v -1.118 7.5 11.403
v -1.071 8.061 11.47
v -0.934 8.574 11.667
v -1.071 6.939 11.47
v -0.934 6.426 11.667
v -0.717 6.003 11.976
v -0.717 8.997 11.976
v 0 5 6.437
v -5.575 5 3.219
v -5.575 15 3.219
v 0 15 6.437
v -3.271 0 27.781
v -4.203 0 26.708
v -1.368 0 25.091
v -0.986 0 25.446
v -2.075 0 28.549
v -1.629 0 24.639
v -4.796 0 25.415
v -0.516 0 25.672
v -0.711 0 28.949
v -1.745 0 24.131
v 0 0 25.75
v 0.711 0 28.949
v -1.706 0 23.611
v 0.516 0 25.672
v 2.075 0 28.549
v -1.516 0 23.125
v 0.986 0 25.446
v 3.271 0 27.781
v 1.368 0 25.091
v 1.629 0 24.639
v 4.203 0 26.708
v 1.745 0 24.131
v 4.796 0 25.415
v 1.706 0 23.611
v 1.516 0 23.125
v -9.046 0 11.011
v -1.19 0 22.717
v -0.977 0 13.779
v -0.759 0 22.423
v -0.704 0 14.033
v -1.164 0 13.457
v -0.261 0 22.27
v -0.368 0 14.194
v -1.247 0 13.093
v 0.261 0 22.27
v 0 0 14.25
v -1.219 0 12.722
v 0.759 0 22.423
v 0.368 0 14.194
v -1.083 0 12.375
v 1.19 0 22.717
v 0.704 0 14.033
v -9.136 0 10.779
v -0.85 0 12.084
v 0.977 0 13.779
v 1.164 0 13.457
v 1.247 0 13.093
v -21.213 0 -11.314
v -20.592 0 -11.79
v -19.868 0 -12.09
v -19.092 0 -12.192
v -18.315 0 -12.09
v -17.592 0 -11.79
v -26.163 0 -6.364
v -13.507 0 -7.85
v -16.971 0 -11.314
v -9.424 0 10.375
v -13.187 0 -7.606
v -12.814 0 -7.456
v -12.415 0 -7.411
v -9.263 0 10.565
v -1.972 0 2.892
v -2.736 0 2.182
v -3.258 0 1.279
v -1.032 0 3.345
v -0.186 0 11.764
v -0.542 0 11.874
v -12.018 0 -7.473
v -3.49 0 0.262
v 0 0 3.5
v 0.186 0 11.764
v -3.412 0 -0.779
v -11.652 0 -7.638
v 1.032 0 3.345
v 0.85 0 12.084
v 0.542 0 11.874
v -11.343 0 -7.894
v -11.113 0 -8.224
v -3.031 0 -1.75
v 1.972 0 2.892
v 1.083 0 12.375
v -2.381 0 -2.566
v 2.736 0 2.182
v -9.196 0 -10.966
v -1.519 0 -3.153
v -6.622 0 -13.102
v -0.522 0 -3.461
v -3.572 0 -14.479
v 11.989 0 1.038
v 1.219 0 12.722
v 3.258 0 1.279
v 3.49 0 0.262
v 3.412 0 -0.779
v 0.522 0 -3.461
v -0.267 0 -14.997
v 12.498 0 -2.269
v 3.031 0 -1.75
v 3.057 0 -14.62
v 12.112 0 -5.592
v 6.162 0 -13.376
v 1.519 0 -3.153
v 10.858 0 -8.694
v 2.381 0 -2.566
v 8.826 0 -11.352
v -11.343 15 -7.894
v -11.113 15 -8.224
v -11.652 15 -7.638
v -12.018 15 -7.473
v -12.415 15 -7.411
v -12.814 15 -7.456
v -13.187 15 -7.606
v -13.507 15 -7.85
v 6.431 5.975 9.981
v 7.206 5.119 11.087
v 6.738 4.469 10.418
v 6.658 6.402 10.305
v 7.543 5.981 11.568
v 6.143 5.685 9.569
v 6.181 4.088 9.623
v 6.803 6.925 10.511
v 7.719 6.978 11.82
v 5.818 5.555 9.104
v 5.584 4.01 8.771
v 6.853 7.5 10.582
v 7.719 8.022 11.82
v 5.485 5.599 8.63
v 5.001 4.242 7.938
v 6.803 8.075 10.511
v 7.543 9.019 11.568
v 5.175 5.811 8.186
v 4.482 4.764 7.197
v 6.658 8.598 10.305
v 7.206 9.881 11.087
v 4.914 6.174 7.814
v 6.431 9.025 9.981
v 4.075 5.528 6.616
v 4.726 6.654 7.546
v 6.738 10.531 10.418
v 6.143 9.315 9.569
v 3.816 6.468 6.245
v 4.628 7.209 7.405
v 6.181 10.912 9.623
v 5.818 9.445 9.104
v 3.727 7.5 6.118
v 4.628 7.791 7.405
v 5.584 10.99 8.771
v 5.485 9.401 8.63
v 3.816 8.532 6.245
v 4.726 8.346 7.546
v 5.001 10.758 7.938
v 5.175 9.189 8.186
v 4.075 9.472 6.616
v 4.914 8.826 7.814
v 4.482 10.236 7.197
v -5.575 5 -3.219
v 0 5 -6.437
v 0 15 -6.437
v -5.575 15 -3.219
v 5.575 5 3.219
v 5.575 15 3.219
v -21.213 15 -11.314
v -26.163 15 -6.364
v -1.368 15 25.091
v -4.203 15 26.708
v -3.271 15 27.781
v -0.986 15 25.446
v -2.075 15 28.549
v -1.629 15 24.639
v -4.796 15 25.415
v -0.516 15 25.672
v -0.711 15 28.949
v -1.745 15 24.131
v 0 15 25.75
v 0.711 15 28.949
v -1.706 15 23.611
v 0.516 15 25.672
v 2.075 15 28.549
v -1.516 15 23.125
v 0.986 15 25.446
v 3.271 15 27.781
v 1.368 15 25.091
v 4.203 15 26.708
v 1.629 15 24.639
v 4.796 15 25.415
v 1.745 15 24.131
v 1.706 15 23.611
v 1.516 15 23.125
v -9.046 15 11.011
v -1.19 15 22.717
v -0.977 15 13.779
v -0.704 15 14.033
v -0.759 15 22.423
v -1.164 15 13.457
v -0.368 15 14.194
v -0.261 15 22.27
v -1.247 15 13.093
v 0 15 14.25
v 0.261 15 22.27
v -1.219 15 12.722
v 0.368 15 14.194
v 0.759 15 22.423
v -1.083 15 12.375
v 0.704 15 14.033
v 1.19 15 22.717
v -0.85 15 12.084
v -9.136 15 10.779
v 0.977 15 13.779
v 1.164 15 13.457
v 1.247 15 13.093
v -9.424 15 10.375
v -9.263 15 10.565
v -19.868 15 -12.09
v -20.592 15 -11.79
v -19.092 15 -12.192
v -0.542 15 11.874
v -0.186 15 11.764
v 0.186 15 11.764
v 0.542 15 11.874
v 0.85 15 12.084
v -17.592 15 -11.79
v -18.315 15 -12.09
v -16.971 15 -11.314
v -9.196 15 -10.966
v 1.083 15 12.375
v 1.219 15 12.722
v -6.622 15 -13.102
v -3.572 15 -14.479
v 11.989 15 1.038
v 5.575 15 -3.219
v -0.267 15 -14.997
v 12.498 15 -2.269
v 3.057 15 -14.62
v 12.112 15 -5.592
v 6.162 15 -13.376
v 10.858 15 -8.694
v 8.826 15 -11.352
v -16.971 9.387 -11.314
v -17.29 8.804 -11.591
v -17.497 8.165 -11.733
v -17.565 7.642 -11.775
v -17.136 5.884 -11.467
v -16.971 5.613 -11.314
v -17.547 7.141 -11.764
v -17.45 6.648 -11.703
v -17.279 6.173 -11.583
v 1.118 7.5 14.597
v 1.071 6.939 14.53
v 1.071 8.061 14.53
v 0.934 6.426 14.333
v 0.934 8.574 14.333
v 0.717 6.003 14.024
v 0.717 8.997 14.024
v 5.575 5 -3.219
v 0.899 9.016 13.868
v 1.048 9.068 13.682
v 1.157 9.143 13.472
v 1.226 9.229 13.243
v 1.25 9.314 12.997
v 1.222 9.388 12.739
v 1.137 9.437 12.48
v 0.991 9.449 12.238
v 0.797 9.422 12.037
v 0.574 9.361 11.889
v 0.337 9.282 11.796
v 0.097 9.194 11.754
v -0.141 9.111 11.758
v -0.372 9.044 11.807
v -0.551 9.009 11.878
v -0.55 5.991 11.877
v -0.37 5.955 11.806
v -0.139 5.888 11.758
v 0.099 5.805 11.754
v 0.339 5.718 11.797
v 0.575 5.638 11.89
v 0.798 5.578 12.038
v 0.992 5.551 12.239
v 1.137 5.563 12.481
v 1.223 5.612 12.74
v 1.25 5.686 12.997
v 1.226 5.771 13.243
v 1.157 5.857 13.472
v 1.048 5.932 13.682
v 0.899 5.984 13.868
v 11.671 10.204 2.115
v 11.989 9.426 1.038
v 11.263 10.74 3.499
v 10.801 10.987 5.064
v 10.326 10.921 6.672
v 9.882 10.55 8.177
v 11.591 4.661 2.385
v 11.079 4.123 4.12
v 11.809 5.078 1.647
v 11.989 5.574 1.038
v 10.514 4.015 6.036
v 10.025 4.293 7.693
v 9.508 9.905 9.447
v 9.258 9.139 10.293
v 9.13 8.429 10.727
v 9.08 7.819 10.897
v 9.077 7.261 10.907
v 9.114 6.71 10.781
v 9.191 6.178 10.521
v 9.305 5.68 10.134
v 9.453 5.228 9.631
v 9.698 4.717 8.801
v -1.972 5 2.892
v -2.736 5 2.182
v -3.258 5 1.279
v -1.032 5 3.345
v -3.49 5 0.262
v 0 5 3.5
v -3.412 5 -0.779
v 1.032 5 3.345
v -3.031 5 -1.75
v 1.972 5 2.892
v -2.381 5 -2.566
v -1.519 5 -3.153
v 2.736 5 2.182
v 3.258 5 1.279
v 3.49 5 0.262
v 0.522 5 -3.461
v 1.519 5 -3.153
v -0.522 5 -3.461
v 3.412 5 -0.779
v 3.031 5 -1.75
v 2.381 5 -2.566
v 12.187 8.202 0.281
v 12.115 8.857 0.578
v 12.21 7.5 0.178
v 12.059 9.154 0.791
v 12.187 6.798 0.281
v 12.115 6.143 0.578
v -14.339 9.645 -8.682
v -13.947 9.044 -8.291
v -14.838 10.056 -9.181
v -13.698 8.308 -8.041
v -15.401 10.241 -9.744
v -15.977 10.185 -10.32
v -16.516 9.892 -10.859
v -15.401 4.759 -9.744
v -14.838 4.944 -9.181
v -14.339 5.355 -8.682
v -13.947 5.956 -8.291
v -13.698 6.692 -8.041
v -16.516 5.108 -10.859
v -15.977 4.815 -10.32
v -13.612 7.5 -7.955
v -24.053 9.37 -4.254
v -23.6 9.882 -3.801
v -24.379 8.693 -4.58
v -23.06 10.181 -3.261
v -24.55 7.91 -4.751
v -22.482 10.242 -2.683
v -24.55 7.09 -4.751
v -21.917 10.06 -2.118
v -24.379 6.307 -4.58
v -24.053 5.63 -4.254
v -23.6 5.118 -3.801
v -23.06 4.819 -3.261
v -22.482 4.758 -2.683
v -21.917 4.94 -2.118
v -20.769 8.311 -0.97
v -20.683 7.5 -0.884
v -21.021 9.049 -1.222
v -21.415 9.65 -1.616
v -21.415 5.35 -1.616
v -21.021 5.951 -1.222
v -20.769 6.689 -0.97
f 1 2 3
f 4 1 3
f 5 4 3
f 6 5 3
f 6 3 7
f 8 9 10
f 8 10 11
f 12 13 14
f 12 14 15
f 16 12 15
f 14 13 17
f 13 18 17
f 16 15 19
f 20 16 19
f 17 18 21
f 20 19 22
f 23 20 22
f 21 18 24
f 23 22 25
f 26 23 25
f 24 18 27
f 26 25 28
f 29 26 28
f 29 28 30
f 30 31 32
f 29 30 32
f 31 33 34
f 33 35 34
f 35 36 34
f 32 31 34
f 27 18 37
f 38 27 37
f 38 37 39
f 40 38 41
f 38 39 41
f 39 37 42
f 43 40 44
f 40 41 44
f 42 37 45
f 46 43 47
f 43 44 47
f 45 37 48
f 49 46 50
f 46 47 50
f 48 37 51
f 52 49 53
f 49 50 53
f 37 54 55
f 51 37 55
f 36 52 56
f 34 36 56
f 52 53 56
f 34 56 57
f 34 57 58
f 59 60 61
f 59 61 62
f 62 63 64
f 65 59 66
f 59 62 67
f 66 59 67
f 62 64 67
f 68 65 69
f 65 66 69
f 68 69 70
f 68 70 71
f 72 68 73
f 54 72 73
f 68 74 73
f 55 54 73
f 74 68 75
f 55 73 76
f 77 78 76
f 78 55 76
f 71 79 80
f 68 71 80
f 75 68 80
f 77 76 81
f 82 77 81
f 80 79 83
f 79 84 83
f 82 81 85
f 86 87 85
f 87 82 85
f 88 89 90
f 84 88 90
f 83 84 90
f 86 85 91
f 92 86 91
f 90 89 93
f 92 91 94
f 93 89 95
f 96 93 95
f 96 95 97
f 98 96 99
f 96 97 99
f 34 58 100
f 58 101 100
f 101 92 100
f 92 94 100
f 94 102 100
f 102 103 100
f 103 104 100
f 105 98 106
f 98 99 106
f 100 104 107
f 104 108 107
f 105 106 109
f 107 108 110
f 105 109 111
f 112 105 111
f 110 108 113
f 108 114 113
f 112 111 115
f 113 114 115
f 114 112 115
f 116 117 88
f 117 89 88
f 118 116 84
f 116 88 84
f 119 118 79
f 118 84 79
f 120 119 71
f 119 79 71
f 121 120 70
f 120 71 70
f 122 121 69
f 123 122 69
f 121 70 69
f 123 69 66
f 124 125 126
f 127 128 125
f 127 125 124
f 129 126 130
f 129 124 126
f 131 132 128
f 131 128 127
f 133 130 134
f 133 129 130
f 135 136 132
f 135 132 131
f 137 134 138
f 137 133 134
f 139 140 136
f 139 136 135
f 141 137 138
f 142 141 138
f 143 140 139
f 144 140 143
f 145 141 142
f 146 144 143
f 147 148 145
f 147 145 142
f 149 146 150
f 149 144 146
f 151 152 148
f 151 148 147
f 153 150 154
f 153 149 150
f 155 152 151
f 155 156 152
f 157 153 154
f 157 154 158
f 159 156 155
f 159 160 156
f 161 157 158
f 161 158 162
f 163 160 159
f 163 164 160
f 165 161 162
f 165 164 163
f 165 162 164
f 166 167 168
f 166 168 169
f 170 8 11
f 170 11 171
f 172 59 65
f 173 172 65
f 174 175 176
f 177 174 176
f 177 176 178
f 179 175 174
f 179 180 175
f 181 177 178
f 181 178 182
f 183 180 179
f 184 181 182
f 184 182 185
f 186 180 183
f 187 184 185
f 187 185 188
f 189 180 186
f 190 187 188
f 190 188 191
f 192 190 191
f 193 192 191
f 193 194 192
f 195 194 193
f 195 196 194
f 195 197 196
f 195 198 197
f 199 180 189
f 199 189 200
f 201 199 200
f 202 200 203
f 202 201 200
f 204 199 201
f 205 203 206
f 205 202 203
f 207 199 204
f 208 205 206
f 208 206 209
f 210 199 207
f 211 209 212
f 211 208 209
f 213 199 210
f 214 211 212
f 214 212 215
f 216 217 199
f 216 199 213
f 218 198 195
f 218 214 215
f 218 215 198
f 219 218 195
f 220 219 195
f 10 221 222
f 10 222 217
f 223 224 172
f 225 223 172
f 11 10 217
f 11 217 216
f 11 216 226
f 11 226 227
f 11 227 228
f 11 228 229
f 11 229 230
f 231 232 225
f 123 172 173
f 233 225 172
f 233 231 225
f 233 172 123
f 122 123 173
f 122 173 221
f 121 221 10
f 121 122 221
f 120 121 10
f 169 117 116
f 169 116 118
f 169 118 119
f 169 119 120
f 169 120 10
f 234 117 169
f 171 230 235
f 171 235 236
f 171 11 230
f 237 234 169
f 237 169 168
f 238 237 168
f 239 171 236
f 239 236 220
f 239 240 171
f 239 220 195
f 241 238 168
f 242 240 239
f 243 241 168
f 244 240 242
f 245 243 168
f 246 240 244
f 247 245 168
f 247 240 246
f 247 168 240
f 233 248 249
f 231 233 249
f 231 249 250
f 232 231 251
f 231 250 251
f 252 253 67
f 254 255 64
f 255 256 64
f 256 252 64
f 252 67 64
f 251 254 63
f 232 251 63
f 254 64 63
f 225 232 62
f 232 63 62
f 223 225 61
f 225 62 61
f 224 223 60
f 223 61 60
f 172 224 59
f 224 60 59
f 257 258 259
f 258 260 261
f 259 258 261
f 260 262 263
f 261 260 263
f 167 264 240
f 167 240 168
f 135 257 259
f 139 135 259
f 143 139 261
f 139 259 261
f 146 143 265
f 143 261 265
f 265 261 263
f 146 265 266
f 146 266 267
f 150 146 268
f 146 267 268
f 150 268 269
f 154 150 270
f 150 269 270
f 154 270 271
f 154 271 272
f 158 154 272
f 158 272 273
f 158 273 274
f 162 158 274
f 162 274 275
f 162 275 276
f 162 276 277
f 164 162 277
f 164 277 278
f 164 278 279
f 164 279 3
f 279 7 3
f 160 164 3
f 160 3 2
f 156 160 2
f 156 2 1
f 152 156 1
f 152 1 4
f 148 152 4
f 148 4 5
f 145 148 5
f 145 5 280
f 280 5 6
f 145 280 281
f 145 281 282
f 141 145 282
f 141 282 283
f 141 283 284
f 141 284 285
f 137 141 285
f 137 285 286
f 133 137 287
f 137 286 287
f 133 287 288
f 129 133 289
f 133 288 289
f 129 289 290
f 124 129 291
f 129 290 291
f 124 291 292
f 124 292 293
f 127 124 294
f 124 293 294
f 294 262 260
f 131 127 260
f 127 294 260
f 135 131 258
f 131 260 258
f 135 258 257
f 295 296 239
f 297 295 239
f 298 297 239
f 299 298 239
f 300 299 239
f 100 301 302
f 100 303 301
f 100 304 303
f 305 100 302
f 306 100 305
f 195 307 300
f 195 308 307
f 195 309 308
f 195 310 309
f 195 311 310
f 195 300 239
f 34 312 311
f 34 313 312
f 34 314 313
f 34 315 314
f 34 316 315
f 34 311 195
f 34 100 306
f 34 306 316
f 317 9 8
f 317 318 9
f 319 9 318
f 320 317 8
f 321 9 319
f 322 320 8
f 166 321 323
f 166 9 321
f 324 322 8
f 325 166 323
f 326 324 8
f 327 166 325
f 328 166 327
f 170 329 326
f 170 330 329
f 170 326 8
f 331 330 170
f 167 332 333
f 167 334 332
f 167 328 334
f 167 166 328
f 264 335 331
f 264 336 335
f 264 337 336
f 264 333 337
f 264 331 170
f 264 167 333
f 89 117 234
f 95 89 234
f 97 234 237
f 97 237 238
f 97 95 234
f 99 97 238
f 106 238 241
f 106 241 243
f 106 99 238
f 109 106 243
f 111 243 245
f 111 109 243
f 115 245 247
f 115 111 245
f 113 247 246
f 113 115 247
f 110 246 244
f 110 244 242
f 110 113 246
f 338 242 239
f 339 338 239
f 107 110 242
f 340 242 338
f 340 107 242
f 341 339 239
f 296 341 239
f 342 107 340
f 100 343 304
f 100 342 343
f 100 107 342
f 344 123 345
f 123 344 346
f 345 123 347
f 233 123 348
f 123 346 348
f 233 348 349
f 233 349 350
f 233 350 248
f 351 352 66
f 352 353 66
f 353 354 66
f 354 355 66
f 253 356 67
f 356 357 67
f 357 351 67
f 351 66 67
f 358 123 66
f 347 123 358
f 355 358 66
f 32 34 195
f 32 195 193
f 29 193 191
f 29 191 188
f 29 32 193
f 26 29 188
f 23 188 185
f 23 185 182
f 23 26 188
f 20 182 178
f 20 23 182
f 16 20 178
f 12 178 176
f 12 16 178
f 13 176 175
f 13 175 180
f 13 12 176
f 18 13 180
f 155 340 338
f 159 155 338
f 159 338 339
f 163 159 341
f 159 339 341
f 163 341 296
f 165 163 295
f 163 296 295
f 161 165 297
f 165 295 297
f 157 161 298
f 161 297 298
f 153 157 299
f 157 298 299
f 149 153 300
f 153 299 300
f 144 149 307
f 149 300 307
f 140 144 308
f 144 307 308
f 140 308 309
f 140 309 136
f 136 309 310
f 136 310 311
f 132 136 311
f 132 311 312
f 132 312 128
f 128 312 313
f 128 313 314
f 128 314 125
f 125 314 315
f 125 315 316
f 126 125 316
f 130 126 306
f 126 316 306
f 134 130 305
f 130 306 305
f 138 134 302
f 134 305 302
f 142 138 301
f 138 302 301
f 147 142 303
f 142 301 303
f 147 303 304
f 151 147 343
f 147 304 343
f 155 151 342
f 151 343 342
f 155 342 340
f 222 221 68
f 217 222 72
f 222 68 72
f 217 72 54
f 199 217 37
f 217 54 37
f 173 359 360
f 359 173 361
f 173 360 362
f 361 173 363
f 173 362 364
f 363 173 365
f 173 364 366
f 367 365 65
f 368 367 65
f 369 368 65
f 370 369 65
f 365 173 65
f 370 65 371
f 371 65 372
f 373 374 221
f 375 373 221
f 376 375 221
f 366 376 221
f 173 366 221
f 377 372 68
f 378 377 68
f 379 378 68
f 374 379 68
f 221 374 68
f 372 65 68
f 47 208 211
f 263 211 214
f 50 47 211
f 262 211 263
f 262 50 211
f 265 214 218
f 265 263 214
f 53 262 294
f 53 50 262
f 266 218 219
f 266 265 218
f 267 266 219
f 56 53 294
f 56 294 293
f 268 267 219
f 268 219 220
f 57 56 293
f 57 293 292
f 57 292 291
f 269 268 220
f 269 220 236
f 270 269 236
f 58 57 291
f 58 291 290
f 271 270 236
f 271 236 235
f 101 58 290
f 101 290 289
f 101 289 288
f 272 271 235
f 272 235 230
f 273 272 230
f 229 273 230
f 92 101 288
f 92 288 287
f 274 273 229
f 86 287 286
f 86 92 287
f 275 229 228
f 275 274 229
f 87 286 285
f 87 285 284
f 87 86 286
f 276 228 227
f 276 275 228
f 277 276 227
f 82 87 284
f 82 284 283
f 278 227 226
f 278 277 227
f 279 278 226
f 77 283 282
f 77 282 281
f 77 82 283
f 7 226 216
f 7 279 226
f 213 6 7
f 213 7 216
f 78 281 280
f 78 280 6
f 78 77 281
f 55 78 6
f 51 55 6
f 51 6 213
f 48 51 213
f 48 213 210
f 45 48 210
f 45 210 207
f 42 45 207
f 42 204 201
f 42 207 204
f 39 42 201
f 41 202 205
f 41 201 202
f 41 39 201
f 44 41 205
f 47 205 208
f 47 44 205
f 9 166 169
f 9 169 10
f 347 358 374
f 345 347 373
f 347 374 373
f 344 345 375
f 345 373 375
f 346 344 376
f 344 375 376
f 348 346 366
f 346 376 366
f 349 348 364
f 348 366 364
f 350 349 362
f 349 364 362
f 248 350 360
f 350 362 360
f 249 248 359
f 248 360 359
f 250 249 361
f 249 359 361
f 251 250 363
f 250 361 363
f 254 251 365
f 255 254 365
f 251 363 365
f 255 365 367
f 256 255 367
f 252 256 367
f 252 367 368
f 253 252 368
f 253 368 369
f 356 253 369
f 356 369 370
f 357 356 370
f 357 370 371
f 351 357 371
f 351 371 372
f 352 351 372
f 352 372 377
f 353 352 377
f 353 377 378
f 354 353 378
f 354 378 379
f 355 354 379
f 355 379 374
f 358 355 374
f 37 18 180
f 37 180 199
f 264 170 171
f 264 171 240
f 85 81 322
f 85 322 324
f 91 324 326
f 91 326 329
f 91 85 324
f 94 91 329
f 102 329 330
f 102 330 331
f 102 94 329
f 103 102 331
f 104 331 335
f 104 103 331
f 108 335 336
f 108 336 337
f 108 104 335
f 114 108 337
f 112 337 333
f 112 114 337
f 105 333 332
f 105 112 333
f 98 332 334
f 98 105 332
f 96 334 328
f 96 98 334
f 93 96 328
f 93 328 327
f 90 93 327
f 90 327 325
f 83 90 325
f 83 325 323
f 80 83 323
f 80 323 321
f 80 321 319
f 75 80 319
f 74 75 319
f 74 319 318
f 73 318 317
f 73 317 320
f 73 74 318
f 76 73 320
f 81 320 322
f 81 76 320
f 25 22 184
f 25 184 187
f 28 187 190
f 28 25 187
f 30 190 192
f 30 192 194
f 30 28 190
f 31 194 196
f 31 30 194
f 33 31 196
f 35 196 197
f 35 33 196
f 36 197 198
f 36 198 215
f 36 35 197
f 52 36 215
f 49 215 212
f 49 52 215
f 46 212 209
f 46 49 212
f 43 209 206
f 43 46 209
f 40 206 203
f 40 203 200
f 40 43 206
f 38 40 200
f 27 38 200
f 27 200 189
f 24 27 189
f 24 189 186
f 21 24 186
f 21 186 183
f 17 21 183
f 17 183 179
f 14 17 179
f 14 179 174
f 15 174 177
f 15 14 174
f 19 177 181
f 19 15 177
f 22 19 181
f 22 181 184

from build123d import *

# Parameters (mm, degrees)
SKETCH1_R           = 1.75
BOSS_EXTRUDE1_DEPTH = 15
SKETCH10_R          = 1.25
CUT_EXTRUDE3_DEPTH  = 35.960692213
SKETCH11_R          = 1.95
CUT_EXTRUDE4_DEPTH  = 47.58229165
SKETCH12_R          = 3.5
BOSS_EXTRUDE8_DEPTH = 5
BOSS_EXTRUDE9_DEPTH = 15
SKETCH14_R          = 2.75
CUT_EXTRUDE5_DEPTH  = 37.697714159
FILLET1_R           = 3
FILLET2_R           = 1.5
SKETCH15_R          = 3.5
CUT_EXTRUDE6_DEPTH  = 13


with BuildPart() as part:
    # Sketch1 → Boss-Extrude1 (new body)
    with BuildSketch(Plane(origin=(0, 0, 0), x_dir=(1, 0, 0), z_dir=(0, 1, 0))):
        with BuildLine():
            Line((-4.795571708, -25.41509434), (-11.988929271, -1.037735849))
            ThreePointArc((-11.988929271, -1.037735849), (0, 15), (11.988929271, -1.037735849))
            Line((11.988929271, -1.037735849), (4.795571708, -25.41509434))
            ThreePointArc((4.795571708, -25.41509434), (0, -29), (-4.795571708, -25.41509434))
        make_face()
        with Locations(Location((0, -24, 0), (0, 0, 270))):
            Circle(SKETCH1_R, mode=Mode.SUBTRACT)
        Polygon((0, -6.437455501), (5.575, -3.218727751), (5.575, 3.218727751), (0, 6.437455501), (-5.575, 3.218727751), (-5.575, -3.218727751), align=None, mode=Mode.SUBTRACT)
    extrude(amount=BOSS_EXTRUDE1_DEPTH)

    # Sketch10 → Cut-Extrude3 (cut, through all)
    with BuildSketch(Plane(origin=(0, 0, 0), x_dir=(1, 0, 0), z_dir=(0, 1, 0))):
        with Locations(Location((0, -13, 0), (0, 0, 270))):
            Circle(SKETCH10_R)
    extrude(amount=CUT_EXTRUDE3_DEPTH, mode=Mode.SUBTRACT)

    # Sketch11 → Cut-Extrude4 (cut, through all)
    with BuildSketch(Plane(origin=(7.806004581, 0, 24.148129883), x_dir=(0.5735764363510473, 0, 0.819152044288991), z_dir=(-0.819152044288991, 0, 0.5735764363510473))):
        with Locations((-13.609353673, 7.5)):
            Circle(SKETCH11_R)
    extrude(amount=-CUT_EXTRUDE4_DEPTH, mode=Mode.SUBTRACT)

    # Sketch12 → Boss-Extrude8 (add)
    with BuildSketch(Plane(origin=(0, 0, 0), x_dir=(1, 0, 0), z_dir=(0, 1, 0))):
        Polygon((5.575, -3.218727751), (5.575, 3.218727751), (0, 6.437455501), (-5.575, 3.218727751), (-5.575, -3.218727751), (0, -6.437455501), align=None)
        with Locations(Location((0, 0, 0), (0, 0, 270))):
            Circle(SKETCH12_R, mode=Mode.SUBTRACT)
    extrude(amount=BOSS_EXTRUDE8_DEPTH)

    # Sketch13 → Boss-Extrude9 (add)
    with BuildSketch(Plane(origin=(0, 0, 0), x_dir=(1, 0, 0), z_dir=(0, 1, 0))):
        Polygon((-19.091883092, 13.435028843), (-26.162950904, 6.363961031), (-8, -11.798989873), (-8, 2.343145751), align=None)
    extrude(amount=BOSS_EXTRUDE9_DEPTH)

    # Sketch14 → Cut-Extrude5 (cut, through all)
    with BuildSketch(Plane(origin=(-9.899494937, 0, 9.899494937), x_dir=(0.707106781186549, 0, 0.707106781186546), z_dir=(-0.707106781186546, 0, 0.707106781186549))):
        with Locations((-18, 7.5)):
            Circle(SKETCH14_R)
    extrude(amount=-CUT_EXTRUDE5_DEPTH, mode=Mode.SUBTRACT)

    # Fillet1
    # the kernel refuses this fillet: 3 mm, written as the material it takes off along each edge
    with BuildSketch(Plane(origin=(-19.091883092, -7.5, -13.435028843), x_dir=(0.7071067811865492, 0, 0.7071067811865457), z_dir=(0, 1, 0))) as fillet1_piece_1:
        with BuildLine():
            CenterArc((FILLET1_R, -FILLET1_R), FILLET1_R, 90, 90)
            Line((0, -FILLET1_R), (0, 0))
            Line((0, 0), (FILLET1_R, 0))
        make_face()
    extrude(amount=30, mode=Mode.SUBTRACT)

    # Fillet2
    fillet2_edges = [part.edges().sort_by_distance(p)[0] for p in [
        (-9.153981014, 7.5, 10.645008859),
        (-11.920074413, 7.5, -6.263220163),
    ]]
    fillet(fillet2_edges, radius=FILLET2_R)

    # Sketch15 → Cut-Extrude6 (cut)
    with BuildSketch(Plane(origin=(10.275038851, 0, -7.194659659), x_dir=(0, -1, 0), z_dir=(0.819152044288991, 0, -0.5735764363510473))):
        with Locations(Location((-7.5, -10.648976576, 0), (0, 0, 90))):
            Circle(SKETCH15_R)
    extrude(amount=-CUT_EXTRUDE6_DEPTH, mode=Mode.SUBTRACT)


solid = part.part
